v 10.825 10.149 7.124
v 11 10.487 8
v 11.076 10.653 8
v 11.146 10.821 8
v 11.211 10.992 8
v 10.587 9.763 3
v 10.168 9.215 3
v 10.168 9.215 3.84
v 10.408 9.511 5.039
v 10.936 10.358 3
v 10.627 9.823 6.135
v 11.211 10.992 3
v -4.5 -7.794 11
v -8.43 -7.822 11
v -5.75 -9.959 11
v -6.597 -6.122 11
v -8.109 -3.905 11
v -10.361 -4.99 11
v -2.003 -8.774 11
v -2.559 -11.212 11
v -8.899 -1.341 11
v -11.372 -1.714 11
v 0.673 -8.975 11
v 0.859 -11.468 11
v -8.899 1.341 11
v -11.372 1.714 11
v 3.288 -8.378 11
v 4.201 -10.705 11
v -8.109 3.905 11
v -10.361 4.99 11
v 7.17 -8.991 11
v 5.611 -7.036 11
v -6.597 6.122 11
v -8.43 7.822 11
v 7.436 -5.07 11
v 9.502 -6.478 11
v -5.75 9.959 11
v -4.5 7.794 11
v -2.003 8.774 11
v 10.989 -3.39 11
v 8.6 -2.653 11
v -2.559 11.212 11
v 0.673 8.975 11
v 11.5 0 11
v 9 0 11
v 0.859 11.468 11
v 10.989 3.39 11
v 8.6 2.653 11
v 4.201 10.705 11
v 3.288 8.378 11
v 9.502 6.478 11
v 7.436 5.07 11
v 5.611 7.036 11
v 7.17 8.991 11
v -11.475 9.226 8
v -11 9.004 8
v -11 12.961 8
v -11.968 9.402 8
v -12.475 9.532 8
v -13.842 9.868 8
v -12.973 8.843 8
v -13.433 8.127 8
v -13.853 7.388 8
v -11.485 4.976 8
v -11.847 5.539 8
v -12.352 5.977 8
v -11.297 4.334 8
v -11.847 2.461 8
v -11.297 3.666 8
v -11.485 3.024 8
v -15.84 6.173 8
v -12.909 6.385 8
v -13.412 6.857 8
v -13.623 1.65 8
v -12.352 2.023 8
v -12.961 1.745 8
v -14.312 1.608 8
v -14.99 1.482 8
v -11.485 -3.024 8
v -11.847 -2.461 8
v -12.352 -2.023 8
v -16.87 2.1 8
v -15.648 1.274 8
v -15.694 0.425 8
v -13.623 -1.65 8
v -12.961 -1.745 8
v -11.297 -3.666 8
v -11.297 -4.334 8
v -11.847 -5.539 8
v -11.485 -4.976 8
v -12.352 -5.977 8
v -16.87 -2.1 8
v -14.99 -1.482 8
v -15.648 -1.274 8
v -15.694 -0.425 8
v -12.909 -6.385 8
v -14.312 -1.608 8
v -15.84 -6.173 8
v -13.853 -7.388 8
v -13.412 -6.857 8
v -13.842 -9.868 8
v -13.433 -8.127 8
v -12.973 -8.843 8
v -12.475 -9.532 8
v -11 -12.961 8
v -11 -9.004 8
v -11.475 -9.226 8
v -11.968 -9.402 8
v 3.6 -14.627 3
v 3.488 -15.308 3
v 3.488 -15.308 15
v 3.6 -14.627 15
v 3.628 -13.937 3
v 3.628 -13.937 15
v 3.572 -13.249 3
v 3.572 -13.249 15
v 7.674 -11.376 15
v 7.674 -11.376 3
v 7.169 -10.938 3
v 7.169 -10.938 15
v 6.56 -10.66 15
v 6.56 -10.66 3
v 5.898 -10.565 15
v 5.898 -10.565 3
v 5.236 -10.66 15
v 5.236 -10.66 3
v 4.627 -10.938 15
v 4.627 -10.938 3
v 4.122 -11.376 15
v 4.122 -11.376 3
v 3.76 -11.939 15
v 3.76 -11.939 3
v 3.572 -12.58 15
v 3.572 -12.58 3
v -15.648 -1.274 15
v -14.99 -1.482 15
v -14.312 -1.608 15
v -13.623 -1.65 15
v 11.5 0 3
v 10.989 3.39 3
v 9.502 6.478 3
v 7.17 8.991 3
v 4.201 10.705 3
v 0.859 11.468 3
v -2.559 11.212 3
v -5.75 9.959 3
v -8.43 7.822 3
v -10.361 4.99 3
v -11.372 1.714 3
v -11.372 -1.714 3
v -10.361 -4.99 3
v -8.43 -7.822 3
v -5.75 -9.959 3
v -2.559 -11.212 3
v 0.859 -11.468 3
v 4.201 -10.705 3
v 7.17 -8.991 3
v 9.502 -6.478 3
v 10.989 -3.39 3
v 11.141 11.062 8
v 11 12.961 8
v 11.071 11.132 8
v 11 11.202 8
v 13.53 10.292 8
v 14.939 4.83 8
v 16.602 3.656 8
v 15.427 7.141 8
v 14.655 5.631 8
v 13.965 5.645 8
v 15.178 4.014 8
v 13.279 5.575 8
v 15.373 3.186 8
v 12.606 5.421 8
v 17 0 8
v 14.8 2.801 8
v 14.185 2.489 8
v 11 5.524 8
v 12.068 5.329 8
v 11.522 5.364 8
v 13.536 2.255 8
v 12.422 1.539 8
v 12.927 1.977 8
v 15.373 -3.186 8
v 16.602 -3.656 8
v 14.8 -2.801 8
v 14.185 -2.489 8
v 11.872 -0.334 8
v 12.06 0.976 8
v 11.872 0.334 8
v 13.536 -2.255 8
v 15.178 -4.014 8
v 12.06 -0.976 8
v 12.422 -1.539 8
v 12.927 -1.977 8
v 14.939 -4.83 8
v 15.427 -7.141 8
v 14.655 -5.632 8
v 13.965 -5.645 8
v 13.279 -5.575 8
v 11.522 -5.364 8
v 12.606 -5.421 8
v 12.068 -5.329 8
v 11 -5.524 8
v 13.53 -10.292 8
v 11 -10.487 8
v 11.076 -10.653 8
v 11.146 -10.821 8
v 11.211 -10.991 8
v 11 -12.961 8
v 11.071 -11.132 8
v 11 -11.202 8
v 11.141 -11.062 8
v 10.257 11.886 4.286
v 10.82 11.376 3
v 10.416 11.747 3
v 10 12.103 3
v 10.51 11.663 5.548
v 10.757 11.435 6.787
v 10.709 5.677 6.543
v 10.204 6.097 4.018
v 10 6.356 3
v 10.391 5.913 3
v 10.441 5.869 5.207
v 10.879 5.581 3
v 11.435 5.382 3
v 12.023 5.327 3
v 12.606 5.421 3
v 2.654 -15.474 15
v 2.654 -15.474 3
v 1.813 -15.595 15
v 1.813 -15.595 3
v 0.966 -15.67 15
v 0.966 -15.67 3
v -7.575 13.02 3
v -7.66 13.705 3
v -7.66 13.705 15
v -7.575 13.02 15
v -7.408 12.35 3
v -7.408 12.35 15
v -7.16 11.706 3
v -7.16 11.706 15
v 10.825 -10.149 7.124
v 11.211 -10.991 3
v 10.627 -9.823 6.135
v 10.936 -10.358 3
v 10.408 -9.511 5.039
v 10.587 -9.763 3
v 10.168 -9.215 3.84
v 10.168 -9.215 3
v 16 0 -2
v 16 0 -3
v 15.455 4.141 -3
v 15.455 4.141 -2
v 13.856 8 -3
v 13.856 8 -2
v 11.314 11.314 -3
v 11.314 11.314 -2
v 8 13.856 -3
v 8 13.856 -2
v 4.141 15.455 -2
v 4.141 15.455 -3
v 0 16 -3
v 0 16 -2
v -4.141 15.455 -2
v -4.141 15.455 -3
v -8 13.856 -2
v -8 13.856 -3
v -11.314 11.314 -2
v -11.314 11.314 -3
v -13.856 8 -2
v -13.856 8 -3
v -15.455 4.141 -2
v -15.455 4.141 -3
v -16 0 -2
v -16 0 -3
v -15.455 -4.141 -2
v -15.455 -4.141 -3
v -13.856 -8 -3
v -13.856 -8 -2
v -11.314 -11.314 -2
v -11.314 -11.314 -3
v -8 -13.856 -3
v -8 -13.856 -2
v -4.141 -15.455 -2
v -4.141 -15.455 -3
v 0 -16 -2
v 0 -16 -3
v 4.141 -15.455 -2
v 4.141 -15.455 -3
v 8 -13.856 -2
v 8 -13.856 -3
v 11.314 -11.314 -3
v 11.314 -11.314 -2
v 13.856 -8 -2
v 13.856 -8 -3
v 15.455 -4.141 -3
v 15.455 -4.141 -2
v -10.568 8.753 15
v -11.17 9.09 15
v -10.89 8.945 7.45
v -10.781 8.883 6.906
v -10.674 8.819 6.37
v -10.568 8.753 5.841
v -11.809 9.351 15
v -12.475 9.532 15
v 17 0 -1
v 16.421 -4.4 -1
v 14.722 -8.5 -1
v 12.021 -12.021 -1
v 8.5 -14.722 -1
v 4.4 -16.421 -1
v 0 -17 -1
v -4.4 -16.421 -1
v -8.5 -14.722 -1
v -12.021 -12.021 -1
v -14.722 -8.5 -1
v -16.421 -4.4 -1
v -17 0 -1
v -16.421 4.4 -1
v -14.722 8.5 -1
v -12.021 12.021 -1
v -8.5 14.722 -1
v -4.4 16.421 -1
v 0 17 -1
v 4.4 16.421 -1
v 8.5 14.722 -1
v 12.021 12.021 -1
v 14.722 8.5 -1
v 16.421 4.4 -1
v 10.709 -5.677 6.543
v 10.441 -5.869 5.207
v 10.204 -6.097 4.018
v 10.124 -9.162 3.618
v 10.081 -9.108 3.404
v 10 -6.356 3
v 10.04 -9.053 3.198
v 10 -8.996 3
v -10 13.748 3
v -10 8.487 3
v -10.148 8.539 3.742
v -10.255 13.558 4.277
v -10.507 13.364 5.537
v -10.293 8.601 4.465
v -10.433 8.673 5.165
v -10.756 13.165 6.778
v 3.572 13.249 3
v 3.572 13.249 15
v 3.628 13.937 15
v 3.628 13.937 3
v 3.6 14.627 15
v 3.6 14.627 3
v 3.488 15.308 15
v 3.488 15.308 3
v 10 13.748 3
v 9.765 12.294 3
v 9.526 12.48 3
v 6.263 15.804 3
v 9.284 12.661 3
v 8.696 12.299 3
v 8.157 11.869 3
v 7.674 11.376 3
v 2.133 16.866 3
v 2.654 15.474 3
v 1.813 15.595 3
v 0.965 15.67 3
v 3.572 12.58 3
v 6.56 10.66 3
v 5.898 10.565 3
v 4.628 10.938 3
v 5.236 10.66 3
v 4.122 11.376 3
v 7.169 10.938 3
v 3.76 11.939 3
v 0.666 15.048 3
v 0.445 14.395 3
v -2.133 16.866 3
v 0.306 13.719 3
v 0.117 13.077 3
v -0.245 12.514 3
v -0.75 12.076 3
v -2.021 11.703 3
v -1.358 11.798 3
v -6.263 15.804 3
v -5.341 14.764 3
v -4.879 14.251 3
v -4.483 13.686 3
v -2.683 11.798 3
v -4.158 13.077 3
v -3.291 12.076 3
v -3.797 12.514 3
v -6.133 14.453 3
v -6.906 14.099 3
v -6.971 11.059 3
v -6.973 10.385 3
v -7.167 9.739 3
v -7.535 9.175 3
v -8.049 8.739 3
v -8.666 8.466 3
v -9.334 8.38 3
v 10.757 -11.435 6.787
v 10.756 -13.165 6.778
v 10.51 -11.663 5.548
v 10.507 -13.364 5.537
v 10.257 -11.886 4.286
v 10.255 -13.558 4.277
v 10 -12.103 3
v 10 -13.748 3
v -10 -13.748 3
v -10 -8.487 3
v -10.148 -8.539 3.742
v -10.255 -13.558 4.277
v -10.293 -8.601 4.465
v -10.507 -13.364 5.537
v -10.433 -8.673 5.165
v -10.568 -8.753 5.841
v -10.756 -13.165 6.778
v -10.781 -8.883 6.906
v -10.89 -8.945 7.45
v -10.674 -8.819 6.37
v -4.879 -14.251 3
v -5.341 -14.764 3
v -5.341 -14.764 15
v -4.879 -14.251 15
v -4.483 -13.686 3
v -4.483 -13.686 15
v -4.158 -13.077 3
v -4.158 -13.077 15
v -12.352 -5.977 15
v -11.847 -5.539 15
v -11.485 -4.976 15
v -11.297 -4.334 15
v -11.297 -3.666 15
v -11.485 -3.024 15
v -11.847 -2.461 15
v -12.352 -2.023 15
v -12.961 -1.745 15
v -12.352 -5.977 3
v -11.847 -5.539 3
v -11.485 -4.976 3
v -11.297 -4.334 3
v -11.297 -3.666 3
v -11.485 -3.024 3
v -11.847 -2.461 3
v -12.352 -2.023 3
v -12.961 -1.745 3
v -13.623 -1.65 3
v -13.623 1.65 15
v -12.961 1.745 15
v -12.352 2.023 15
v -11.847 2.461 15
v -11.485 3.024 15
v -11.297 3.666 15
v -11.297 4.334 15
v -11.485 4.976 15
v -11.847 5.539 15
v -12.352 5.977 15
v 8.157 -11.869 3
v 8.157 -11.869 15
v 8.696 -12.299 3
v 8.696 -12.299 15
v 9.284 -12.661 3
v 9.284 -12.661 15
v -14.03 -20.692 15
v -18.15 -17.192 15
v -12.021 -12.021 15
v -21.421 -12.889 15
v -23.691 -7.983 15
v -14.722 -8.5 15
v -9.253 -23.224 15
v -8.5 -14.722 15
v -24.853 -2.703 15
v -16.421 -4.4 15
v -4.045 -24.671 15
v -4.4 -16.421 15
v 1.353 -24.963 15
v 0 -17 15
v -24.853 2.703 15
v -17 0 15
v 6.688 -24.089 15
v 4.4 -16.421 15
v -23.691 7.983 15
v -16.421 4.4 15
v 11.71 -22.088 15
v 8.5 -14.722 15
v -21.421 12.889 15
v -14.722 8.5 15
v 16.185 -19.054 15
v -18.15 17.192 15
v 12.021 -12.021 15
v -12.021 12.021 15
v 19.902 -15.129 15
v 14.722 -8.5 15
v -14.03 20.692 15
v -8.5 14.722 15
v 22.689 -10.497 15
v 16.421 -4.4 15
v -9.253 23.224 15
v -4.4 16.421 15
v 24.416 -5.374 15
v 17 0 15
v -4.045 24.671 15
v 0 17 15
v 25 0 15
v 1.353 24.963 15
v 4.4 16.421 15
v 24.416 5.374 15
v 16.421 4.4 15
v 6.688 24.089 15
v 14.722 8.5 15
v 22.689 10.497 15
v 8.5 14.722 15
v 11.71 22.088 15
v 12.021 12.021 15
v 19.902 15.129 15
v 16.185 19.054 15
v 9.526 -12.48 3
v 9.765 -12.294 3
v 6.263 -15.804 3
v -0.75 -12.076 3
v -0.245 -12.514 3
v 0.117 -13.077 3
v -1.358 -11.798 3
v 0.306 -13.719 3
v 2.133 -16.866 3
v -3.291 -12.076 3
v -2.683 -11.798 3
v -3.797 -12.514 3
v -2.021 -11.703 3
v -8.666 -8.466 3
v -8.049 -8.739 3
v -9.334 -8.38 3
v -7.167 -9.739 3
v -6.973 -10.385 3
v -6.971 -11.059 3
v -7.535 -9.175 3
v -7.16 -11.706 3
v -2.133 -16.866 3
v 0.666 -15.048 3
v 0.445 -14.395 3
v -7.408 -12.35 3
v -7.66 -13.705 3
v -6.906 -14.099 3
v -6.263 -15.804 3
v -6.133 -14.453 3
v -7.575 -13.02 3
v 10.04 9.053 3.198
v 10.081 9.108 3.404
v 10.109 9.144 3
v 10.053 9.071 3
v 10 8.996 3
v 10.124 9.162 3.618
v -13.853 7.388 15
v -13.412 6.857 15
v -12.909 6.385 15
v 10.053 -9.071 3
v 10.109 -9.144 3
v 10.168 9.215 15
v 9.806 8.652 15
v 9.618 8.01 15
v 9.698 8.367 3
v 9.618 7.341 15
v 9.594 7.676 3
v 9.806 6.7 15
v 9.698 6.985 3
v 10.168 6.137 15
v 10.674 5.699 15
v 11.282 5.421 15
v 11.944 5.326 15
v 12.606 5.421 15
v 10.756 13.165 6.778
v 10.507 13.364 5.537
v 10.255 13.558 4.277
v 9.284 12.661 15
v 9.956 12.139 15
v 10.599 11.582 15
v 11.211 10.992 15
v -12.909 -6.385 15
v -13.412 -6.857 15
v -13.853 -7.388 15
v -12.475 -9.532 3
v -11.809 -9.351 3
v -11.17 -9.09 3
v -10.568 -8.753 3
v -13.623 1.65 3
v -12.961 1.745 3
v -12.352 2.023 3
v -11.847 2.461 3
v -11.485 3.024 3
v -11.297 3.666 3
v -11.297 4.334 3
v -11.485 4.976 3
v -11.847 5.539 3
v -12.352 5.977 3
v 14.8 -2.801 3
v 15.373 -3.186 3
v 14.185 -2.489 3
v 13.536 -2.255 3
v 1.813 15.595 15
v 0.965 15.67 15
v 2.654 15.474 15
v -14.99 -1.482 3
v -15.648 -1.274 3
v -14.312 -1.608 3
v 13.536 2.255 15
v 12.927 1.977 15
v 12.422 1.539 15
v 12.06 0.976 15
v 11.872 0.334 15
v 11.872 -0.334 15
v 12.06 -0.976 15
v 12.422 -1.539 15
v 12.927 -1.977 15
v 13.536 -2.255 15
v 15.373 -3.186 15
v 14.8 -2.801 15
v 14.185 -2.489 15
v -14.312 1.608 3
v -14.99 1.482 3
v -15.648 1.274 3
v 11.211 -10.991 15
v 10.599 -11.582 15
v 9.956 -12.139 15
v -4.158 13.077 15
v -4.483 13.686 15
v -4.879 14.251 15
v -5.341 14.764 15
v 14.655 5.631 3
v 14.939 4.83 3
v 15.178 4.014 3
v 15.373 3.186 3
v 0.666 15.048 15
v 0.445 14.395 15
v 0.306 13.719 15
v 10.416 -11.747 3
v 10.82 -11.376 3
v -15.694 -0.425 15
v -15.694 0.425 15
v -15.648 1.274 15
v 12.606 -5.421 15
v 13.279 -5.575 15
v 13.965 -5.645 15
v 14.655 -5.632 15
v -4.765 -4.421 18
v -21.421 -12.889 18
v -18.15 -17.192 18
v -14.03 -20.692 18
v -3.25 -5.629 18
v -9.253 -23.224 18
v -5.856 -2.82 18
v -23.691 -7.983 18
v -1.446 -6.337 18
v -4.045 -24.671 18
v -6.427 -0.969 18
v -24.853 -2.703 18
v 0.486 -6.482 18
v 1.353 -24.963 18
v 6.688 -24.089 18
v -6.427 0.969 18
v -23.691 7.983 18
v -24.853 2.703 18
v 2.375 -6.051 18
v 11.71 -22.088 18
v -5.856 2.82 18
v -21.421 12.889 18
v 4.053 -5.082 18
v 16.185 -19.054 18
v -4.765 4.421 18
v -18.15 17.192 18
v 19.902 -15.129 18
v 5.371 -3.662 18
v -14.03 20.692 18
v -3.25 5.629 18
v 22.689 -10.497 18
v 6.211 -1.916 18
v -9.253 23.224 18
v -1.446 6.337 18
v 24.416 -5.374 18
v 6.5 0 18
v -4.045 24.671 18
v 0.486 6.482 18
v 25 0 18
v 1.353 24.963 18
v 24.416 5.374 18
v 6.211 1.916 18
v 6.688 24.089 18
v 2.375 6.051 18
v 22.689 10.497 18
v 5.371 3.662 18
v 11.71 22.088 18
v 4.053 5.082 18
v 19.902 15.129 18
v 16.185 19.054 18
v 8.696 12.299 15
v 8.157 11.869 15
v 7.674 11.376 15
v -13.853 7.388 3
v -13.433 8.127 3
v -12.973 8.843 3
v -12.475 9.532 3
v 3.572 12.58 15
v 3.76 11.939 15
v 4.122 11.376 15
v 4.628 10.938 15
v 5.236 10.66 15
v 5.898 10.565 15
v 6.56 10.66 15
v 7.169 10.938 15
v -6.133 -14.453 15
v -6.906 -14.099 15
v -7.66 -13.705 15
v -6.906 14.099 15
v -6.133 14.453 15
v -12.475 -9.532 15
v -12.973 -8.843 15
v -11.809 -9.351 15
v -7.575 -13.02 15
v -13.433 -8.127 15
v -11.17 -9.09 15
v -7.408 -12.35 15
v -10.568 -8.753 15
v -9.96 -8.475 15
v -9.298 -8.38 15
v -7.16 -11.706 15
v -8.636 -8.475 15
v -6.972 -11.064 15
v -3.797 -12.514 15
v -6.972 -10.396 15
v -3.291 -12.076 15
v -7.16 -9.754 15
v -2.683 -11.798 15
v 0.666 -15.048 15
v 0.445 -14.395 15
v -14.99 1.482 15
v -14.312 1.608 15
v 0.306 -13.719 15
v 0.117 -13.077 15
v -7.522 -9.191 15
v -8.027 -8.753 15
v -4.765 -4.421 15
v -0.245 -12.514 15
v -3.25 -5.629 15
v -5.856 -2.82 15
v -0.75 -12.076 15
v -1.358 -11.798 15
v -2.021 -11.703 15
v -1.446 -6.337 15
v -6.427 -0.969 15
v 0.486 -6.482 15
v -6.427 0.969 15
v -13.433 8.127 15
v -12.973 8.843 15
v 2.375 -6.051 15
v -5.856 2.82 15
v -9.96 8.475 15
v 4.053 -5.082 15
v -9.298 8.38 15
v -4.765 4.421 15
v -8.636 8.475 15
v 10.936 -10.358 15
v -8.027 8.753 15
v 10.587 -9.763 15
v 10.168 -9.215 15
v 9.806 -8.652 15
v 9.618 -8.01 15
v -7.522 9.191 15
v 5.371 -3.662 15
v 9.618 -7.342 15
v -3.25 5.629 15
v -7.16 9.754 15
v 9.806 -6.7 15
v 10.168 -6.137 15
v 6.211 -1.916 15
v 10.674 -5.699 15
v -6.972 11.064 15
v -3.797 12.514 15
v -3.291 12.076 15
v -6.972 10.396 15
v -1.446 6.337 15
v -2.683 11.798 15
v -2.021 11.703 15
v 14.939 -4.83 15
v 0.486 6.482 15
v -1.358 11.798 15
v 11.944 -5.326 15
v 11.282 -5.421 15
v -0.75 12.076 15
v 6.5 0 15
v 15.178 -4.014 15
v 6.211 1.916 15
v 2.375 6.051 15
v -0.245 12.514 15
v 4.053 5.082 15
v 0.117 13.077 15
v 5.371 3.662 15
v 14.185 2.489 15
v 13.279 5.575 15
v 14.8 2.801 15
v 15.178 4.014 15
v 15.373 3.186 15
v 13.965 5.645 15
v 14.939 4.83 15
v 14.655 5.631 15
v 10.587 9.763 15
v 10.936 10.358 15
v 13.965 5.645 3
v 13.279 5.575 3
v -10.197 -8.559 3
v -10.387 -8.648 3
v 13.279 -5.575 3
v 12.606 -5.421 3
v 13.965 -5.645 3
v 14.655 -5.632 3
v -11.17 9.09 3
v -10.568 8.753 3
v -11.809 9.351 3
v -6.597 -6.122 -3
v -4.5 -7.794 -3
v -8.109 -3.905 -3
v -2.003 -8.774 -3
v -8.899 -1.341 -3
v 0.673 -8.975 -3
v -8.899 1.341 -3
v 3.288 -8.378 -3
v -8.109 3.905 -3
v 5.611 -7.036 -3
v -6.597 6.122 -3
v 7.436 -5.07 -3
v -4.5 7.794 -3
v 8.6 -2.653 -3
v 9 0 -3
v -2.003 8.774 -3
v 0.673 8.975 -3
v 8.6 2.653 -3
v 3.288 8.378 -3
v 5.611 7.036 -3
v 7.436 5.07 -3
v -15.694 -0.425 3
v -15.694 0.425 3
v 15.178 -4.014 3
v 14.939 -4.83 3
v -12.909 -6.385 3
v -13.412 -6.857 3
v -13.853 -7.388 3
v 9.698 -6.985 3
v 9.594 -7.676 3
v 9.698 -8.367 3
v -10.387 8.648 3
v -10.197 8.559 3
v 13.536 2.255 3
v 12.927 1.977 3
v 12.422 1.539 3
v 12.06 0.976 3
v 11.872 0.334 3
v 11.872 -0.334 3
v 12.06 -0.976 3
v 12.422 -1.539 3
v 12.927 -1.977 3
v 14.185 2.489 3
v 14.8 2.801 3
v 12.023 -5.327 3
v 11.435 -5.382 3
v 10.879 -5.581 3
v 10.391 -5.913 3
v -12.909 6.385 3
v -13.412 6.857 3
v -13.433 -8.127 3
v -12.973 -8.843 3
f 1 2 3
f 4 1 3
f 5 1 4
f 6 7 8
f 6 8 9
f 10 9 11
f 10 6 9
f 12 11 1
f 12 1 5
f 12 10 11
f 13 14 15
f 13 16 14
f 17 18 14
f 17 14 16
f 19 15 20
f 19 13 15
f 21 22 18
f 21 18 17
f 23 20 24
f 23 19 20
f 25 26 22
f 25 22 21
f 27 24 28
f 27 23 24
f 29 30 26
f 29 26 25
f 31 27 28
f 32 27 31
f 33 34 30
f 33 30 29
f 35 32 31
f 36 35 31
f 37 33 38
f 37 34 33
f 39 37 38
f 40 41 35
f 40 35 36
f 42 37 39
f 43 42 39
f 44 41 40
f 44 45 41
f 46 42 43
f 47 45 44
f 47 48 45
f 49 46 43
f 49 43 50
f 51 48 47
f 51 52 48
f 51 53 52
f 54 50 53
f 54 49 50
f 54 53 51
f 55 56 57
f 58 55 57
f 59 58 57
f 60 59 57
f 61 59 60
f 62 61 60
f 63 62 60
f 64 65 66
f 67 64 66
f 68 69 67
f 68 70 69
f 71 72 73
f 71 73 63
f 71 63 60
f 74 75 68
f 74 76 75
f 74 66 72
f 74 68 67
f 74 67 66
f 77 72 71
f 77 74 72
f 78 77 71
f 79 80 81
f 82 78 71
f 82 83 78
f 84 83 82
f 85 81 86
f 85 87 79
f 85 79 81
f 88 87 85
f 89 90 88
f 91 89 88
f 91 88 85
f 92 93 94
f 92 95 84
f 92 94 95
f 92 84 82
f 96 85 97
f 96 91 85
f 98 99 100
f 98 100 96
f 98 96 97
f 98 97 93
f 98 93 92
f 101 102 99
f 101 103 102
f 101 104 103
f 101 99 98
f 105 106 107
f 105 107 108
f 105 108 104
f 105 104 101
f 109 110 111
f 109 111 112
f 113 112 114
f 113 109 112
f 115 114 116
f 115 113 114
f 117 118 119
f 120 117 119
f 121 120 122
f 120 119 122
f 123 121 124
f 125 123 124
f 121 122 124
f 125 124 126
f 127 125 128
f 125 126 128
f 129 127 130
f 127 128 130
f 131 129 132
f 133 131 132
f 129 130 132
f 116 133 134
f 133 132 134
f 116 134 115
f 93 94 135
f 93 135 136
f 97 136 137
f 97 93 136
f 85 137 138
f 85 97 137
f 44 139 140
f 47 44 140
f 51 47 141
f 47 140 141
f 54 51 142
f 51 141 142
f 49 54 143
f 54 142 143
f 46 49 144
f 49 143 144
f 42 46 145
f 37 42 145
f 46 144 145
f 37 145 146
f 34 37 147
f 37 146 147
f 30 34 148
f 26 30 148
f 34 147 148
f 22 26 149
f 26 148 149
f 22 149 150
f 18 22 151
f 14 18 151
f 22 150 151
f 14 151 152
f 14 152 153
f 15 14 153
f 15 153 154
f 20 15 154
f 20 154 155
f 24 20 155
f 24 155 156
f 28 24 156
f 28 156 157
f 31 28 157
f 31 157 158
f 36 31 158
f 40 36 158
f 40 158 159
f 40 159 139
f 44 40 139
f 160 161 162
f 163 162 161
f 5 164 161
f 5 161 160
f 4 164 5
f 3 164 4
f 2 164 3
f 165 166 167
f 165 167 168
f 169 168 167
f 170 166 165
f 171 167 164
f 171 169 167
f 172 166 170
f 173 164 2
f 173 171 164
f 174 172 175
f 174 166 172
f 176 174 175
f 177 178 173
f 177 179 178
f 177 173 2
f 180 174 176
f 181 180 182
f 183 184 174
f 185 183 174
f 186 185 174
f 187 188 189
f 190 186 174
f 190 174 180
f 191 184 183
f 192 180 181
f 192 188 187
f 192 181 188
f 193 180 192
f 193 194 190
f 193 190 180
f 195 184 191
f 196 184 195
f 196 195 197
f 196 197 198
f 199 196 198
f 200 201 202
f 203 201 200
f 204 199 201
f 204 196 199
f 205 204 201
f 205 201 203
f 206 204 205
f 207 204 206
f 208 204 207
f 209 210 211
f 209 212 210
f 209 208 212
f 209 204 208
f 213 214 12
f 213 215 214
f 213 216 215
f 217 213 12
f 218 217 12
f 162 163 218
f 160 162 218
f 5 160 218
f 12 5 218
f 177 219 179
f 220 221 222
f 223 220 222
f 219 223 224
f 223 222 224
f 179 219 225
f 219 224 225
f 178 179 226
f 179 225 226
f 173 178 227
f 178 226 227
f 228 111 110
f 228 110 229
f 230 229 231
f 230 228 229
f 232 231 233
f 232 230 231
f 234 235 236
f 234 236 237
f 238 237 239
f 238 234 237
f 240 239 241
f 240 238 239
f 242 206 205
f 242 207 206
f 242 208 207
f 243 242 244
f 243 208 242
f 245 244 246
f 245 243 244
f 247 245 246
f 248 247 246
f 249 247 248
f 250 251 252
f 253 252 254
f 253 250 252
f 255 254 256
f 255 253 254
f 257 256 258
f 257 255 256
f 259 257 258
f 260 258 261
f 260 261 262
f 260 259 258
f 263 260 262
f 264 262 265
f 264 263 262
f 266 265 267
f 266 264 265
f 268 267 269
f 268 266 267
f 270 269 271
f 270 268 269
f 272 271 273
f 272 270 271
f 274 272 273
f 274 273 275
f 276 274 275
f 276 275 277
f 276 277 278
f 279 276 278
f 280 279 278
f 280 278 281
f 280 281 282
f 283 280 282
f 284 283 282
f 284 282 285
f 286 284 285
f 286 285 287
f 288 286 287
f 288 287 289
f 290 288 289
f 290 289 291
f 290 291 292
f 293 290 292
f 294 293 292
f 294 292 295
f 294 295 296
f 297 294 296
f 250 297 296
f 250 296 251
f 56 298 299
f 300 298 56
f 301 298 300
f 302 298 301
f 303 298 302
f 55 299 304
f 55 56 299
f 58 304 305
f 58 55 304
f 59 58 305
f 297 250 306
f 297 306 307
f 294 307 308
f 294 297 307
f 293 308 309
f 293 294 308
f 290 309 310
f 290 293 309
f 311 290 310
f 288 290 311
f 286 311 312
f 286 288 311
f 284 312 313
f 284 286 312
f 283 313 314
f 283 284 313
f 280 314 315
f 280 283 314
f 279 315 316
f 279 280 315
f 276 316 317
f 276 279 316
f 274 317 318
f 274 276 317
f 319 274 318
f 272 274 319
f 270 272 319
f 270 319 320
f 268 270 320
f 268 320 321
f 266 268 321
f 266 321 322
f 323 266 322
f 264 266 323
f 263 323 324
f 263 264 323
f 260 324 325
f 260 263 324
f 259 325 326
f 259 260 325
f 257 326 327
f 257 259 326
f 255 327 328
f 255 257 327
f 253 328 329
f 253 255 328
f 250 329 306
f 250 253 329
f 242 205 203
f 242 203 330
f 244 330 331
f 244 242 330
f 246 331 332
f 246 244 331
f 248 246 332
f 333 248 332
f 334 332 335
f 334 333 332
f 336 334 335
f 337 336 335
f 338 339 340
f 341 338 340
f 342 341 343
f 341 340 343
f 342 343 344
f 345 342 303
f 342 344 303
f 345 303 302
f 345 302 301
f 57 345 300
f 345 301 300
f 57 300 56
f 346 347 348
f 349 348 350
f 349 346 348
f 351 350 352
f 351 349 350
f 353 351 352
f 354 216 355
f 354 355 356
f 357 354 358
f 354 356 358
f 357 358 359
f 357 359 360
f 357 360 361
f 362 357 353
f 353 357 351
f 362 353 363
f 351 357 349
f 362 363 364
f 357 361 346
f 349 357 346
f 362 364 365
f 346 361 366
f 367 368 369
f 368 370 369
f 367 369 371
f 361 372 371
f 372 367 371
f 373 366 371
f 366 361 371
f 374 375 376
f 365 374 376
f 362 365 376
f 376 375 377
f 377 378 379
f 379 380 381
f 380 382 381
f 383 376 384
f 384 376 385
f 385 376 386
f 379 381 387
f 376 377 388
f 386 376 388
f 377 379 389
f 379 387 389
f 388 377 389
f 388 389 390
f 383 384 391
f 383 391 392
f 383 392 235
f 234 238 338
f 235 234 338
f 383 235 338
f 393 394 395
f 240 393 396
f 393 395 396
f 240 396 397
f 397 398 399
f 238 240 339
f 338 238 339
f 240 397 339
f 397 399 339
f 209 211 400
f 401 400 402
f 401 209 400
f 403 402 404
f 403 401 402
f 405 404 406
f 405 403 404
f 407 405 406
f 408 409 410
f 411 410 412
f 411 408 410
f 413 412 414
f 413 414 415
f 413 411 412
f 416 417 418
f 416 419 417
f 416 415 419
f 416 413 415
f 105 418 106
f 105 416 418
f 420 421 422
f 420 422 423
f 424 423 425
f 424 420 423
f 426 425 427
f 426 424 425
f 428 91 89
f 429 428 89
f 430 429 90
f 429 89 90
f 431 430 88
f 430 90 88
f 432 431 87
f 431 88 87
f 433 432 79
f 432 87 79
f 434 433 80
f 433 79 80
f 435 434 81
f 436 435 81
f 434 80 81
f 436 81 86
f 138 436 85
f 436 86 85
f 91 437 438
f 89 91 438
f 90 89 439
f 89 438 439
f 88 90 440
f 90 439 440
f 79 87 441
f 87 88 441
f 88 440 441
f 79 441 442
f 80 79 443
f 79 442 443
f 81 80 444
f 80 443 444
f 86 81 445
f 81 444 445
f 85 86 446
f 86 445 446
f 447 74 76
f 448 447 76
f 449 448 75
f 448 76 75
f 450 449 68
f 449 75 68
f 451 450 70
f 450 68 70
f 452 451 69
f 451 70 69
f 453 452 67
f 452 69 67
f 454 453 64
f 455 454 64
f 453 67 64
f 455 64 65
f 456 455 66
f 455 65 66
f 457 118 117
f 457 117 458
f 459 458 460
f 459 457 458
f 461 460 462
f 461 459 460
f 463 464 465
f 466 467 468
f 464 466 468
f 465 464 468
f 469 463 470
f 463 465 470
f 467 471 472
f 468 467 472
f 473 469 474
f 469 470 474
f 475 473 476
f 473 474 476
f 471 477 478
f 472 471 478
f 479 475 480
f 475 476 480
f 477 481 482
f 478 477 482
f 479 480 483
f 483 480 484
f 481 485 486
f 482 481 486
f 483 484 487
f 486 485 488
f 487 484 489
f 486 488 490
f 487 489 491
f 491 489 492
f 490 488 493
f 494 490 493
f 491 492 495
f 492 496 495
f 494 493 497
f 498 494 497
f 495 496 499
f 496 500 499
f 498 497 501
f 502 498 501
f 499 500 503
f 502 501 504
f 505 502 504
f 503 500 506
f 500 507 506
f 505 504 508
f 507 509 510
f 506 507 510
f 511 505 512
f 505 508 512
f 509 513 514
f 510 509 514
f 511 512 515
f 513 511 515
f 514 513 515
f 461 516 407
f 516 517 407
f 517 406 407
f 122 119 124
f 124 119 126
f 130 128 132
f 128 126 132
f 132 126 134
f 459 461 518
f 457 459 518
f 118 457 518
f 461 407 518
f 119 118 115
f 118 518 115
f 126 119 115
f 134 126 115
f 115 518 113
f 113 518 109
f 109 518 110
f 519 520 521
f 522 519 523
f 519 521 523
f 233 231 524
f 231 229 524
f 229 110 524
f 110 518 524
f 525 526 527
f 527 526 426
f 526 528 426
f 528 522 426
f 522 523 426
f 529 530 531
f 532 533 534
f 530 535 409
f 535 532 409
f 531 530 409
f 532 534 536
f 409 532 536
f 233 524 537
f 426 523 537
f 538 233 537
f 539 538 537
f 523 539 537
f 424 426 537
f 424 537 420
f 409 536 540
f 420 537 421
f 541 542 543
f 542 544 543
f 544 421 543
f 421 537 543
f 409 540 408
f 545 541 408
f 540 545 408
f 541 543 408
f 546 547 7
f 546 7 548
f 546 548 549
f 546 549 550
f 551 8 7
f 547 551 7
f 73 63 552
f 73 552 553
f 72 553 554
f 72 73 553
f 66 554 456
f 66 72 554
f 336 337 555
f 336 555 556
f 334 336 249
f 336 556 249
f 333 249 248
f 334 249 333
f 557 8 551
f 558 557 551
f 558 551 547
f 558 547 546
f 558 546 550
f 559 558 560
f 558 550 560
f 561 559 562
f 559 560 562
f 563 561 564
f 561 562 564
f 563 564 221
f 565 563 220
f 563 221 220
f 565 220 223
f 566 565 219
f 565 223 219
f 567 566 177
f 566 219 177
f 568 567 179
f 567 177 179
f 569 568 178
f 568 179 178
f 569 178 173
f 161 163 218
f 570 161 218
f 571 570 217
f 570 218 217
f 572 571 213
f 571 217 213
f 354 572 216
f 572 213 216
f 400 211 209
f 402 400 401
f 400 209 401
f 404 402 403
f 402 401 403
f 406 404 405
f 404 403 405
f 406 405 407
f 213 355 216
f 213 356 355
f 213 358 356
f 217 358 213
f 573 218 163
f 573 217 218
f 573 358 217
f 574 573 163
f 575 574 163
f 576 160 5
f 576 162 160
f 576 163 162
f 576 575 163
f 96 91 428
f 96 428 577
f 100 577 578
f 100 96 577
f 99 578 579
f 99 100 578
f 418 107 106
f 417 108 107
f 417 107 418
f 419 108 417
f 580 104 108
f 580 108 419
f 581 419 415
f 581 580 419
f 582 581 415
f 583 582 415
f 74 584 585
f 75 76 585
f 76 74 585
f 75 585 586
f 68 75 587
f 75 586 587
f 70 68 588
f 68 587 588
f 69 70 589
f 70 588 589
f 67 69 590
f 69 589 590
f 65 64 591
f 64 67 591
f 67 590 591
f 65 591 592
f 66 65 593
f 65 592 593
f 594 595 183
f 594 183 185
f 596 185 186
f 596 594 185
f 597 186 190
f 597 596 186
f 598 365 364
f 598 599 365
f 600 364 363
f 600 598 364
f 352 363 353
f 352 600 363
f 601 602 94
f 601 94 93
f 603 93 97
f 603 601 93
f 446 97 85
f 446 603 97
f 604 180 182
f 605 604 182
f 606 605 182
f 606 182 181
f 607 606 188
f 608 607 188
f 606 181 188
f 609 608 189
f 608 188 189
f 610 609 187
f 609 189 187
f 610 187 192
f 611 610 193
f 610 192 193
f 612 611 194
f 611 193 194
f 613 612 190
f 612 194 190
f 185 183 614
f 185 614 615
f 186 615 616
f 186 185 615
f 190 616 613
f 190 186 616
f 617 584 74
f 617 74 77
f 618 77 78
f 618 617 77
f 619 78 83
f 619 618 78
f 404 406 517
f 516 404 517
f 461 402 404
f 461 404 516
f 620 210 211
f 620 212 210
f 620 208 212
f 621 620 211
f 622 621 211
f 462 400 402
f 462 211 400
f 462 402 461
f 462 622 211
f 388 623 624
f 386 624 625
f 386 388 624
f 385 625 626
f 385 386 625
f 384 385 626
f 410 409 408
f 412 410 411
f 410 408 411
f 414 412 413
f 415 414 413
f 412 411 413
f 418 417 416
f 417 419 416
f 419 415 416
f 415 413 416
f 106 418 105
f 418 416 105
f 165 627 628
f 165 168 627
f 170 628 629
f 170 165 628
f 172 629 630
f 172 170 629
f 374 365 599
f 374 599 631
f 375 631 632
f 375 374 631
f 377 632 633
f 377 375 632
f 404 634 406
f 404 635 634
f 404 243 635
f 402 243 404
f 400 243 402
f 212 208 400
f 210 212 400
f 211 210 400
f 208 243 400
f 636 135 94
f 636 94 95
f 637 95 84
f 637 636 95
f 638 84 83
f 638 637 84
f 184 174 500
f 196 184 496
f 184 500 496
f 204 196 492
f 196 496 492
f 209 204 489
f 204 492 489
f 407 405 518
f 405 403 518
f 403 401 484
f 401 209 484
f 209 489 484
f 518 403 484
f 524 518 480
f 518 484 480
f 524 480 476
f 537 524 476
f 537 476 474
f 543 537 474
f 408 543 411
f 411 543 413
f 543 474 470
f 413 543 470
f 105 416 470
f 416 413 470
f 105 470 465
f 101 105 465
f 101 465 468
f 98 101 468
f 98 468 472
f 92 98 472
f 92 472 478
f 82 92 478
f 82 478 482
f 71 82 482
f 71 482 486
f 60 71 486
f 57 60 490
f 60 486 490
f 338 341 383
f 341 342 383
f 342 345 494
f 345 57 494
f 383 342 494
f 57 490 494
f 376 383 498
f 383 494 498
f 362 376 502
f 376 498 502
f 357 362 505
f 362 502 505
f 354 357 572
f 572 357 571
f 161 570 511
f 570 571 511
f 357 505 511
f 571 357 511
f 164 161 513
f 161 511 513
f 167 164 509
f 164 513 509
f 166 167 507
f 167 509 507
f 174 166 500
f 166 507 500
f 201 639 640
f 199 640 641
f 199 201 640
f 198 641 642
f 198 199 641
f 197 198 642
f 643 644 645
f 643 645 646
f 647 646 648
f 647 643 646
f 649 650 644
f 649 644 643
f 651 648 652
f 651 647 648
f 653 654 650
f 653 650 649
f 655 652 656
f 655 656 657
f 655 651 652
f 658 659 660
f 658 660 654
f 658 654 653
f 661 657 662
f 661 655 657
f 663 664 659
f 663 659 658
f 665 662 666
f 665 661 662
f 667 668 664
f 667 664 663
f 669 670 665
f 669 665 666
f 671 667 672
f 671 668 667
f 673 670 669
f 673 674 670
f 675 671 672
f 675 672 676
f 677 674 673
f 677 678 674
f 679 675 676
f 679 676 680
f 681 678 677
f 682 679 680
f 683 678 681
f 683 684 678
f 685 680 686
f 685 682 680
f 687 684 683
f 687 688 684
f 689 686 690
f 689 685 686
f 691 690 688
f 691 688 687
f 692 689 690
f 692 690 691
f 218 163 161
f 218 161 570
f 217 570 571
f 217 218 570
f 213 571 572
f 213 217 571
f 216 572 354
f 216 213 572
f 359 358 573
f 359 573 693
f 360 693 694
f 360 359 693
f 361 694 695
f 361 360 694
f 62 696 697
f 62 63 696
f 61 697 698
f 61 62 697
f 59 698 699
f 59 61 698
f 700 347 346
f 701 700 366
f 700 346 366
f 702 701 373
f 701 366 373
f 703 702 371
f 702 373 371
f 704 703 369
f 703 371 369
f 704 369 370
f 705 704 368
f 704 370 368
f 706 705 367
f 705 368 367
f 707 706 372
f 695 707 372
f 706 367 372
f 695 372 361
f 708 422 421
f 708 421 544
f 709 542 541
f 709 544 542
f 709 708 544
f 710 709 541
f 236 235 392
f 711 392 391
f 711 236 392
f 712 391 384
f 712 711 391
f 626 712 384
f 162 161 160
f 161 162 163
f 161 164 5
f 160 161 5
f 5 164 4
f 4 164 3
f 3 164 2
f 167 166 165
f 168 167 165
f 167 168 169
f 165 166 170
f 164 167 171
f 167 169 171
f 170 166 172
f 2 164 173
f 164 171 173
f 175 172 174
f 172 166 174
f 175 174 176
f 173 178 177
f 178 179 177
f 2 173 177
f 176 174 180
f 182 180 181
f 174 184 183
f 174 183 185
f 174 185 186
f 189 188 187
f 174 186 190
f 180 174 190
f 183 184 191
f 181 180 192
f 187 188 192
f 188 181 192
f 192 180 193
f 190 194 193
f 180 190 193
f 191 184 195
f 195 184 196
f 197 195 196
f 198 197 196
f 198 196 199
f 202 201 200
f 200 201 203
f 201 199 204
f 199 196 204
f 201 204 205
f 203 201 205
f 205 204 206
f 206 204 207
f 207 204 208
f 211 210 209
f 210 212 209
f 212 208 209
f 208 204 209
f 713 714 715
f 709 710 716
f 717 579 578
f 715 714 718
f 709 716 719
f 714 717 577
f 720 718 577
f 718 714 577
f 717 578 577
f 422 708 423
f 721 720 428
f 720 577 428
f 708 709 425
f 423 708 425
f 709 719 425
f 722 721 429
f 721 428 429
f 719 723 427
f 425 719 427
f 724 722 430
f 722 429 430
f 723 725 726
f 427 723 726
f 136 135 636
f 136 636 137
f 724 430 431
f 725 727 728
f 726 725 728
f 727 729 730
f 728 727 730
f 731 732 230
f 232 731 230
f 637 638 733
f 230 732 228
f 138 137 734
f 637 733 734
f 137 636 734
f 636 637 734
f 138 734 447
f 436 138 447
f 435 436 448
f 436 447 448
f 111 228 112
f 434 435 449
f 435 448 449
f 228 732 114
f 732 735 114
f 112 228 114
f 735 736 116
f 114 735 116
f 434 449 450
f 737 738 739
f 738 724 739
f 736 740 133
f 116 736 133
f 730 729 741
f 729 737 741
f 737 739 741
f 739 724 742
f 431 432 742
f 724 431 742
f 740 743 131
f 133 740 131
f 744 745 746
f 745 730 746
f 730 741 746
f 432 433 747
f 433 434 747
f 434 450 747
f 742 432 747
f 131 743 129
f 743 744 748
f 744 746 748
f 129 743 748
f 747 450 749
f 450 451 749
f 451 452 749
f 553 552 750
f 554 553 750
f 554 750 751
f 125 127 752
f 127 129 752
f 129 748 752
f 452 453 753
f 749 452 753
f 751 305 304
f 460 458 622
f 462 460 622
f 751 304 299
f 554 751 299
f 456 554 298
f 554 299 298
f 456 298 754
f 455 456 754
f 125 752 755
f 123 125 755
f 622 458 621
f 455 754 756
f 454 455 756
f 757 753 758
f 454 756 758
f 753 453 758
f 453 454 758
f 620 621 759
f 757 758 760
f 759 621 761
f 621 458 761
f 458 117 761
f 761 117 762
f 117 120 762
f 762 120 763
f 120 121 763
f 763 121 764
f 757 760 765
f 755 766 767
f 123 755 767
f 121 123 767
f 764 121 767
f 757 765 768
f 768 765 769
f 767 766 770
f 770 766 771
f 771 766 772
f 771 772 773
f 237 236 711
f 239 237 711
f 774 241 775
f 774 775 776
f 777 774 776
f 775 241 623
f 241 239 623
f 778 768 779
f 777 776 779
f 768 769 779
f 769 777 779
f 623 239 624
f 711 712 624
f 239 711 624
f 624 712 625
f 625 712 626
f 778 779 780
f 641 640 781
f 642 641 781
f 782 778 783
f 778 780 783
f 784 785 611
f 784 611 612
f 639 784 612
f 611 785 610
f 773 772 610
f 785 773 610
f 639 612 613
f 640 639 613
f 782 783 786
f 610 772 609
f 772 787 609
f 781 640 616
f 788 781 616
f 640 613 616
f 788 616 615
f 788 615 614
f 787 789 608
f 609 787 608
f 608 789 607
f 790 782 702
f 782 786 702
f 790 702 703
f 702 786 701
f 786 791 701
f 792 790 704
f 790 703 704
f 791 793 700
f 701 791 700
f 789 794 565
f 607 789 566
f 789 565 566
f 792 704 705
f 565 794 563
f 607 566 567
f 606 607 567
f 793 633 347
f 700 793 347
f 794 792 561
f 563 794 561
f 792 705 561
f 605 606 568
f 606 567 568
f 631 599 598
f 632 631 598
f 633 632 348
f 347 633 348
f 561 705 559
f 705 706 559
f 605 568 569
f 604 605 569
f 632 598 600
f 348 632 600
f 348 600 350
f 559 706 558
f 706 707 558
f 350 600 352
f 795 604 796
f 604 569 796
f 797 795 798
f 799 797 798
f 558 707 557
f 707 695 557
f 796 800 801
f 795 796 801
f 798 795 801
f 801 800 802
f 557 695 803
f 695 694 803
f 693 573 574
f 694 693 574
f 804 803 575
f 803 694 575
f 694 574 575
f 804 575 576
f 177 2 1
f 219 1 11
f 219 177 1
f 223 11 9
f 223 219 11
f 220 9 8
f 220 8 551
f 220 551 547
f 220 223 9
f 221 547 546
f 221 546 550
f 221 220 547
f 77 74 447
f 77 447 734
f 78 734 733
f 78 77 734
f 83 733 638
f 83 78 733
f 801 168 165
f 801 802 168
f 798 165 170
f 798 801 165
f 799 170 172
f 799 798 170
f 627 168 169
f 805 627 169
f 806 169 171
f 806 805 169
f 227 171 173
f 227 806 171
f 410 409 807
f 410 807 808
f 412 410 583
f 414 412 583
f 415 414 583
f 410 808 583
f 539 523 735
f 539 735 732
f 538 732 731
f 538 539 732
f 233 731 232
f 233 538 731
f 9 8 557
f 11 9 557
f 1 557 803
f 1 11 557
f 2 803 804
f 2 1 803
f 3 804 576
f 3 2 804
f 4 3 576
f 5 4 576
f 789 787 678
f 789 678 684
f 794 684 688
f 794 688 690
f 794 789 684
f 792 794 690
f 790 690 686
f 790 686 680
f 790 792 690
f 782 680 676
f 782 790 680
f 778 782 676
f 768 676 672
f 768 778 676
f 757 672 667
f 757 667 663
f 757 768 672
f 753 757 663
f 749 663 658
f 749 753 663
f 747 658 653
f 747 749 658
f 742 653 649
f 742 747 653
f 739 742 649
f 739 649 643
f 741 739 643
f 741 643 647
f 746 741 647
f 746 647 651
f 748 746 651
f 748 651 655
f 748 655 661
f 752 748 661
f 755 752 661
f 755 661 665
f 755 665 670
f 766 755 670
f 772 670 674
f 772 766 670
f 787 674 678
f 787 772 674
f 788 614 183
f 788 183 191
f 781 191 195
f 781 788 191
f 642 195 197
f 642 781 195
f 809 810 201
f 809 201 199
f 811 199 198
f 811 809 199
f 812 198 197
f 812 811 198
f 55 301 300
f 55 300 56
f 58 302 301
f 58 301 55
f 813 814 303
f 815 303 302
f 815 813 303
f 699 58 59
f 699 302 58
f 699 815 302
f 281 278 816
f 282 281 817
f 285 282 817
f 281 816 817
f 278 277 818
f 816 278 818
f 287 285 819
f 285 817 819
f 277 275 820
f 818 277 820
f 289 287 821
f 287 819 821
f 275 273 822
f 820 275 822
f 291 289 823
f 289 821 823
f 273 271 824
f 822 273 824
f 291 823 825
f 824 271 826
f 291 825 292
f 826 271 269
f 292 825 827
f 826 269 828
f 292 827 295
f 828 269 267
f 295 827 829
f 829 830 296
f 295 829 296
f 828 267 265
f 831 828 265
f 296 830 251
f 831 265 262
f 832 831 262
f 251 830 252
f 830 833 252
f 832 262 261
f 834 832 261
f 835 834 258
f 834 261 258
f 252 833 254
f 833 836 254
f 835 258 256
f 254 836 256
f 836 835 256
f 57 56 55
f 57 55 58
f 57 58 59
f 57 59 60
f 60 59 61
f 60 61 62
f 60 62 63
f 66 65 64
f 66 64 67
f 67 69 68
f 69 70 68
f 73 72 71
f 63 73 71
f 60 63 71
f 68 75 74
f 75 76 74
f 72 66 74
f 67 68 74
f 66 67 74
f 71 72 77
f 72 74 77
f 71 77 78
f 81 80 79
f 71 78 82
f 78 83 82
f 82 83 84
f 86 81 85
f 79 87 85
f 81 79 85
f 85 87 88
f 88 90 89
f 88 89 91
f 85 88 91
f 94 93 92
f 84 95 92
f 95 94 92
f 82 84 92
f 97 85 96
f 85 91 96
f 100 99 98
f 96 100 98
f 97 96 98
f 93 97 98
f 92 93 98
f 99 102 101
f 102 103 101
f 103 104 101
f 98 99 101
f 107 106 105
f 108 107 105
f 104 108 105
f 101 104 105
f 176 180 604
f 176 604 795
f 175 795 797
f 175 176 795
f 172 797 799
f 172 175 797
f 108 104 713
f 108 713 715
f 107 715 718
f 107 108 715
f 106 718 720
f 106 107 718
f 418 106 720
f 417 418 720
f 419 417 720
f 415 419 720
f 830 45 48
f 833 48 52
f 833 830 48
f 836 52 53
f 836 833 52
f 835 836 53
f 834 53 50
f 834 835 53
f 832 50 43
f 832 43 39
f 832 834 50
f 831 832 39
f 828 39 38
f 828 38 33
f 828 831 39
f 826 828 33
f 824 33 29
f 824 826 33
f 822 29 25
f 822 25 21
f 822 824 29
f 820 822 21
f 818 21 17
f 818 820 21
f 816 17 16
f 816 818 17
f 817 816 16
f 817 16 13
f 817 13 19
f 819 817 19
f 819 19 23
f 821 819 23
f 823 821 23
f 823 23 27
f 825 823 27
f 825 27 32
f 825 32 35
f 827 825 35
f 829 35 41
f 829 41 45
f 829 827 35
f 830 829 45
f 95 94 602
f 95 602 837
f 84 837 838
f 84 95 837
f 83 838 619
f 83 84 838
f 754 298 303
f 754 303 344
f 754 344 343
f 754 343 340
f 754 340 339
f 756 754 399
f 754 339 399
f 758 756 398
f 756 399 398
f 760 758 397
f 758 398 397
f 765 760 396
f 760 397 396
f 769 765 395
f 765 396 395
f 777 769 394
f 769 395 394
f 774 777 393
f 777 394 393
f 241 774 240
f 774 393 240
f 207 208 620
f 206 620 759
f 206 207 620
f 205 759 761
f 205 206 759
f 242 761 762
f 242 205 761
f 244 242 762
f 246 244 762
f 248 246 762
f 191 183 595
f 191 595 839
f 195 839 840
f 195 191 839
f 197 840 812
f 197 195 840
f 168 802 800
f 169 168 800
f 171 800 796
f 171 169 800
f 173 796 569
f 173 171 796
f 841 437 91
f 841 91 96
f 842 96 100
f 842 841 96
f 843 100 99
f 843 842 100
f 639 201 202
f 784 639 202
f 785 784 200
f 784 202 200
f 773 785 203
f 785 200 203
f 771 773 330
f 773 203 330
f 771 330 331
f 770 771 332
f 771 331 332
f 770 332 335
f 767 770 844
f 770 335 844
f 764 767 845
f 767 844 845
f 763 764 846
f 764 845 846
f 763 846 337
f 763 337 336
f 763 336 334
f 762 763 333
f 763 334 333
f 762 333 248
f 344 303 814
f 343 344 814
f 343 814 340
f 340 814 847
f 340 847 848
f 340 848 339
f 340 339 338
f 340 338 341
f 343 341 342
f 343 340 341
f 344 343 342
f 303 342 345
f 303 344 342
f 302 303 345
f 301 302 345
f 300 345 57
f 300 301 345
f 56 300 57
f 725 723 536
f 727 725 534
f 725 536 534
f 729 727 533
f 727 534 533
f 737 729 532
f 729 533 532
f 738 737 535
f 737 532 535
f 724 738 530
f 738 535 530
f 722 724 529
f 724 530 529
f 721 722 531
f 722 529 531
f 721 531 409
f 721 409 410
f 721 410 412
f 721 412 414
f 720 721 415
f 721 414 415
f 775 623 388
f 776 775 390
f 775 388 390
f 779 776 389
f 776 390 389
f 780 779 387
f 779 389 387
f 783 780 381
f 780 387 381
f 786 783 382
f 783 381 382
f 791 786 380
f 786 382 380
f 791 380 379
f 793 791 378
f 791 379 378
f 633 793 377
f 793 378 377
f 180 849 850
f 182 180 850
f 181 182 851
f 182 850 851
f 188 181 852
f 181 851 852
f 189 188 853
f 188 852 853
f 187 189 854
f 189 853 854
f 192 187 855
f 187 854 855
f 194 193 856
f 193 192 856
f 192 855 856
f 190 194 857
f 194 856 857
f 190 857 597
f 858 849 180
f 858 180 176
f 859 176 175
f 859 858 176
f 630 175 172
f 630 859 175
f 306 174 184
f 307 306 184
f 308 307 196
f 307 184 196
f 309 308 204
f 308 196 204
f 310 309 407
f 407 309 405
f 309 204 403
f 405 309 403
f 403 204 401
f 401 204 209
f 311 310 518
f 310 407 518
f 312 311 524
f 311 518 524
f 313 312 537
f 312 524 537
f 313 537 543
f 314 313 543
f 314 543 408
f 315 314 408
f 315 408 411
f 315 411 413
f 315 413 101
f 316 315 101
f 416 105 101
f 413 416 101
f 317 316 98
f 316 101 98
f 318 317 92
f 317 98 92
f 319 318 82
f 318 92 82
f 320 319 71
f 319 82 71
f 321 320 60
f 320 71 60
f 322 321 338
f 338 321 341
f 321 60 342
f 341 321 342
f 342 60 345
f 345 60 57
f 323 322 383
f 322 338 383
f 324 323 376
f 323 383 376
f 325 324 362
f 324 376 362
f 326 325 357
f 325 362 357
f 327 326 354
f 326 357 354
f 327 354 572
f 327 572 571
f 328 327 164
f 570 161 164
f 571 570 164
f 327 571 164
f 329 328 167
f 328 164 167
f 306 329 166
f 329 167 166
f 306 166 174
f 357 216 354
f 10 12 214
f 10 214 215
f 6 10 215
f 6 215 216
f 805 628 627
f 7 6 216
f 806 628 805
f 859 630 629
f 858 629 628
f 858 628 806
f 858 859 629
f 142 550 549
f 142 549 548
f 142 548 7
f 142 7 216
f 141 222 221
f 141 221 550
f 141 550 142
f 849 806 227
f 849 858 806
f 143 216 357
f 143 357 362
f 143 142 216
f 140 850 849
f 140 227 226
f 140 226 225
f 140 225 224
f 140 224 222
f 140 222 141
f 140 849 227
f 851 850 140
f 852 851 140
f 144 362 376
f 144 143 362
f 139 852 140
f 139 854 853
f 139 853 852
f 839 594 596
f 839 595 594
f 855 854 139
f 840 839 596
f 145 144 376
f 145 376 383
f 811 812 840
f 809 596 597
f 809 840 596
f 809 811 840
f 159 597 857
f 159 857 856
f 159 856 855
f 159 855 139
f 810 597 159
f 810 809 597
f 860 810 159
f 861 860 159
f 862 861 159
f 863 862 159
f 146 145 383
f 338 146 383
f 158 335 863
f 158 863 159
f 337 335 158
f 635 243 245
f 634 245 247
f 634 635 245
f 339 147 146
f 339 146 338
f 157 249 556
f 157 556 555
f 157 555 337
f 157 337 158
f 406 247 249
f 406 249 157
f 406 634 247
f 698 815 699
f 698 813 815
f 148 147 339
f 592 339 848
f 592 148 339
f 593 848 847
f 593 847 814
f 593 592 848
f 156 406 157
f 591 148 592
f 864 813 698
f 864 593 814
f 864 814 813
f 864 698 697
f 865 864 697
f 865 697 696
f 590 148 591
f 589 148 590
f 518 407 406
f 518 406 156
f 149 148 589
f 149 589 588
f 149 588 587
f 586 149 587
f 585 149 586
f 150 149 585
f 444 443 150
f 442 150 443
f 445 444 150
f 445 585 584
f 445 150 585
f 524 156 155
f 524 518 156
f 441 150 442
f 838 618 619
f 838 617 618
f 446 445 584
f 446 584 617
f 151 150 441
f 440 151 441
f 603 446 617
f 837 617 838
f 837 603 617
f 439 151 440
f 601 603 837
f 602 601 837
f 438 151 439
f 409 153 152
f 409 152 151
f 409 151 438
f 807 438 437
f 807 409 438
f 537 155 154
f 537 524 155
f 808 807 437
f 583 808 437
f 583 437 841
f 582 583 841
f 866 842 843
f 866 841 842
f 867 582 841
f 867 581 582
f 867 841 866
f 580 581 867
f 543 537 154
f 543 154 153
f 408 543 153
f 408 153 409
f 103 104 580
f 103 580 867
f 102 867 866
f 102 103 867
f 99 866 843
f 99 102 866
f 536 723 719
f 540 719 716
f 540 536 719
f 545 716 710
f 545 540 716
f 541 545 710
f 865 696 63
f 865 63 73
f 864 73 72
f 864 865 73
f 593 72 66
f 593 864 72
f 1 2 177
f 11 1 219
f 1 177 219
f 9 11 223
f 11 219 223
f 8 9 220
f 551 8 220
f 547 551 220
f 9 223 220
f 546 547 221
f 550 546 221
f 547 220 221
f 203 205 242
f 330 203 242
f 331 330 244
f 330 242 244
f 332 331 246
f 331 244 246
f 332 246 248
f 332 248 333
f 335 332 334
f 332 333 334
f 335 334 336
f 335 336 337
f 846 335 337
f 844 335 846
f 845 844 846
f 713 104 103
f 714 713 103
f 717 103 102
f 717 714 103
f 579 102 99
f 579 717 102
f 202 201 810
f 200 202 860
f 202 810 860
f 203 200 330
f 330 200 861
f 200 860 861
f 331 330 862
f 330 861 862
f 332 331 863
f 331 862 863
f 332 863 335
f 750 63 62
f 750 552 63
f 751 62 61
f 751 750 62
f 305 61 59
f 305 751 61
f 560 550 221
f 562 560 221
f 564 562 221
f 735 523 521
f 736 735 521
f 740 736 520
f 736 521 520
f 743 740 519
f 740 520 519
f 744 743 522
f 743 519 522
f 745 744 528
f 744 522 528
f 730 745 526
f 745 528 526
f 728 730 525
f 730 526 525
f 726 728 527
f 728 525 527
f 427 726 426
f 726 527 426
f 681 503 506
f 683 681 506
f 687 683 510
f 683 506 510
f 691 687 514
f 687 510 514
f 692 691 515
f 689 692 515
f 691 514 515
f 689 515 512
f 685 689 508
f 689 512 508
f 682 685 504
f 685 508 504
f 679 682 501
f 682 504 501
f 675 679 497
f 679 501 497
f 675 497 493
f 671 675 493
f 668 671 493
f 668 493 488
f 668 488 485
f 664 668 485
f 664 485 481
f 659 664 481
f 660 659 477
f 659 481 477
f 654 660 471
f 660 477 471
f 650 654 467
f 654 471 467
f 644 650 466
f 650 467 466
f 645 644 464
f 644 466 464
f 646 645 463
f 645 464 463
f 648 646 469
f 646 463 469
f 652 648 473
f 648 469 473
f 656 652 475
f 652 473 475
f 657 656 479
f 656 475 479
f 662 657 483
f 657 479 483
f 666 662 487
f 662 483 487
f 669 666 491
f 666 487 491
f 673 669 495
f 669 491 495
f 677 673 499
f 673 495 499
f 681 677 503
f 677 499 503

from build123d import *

# Parameters (mm, degrees)
PAD004_DEPTH      = 20
PAD004_DEPTH_BACK = 20
SKETCH_R          = 20
PAD_DEPTH         = 15
SKETCH001_R       = 20
SKETCH001_R_2     = 15.7
PAD001_DEPTH      = 15
SKETCH002_R       = 20
SKETCH002_R_2     = 17
POCKET_DEPTH      = 15
SKETCH003_R       = 25
SKETCH003_R_2     = 6.5
PAD002_DEPTH      = 3
SKETCH004_R       = 17
SKETCH004_R_2     = 15.7
PAD003_DEPTH      = 2
CHAMFER_SIZE      = 1
SKETCH006_R       = 16
SKETCH006_R_2     = 9
PAD005_DEPTH      = 3
SKETCH007_R       = 11.5
SKETCH007_R_2     = 9
PAD006_DEPTH      = 11
SKETCH008_R       = 16
SKETCH008_R_2     = 9
PAD007_DEPTH      = 3


with BuildPart() as body001:
    # Sketch005 → Pad004 (new body, two sides)
    with BuildSketch(Plane.XZ) as pad004_sk:
        Polygon((-25, 8), (-25, -3), (25, -3), (25, 8), (11, 8), (10, 3), (-10, 3), (-11, 8), align=None)
    extrude(amount=PAD004_DEPTH)
    extrude(pad004_sk.sketch, amount=-PAD004_DEPTH_BACK)


with BuildPart() as body:
    # Sketch → Pad (new body)
    with BuildSketch(Plane.XY):
        Circle(SKETCH_R)
        with BuildLine():
            ThreePointArc((10.167973, 9.214823), (11.257777, 11.127264), (11.534091, 13.311011))
            ThreePointArc((11.534091, 13.311011), (9.411904, 12.72674), (7.674027, 11.375877))
            ThreePointArc((3.571901, 13.249202), (4.921792, 10.777143), (7.674027, 11.375877))
            ThreePointArc((3.571901, 13.249202), (3.454758, 15.447252), (2.506576, 17.433732))
            ThreePointArc((2.506576, 17.433732), (1.03717, 15.794875), (0.305512, 13.718898))
            ThreePointArc((-4.158239, 13.077082), (-1.686132, 11.727209), (0.305512, 13.718898))
            ThreePointArc((-4.158239, 13.077082), (-5.44512, 14.862823), (-7.316711, 16.021305))
            ThreePointArc((-7.316711, 16.021305), (-7.666817, 13.848196), (-7.159961, 11.706218))
            ThreePointArc((-10.568123, 8.753065), (-7.758688, 8.953979), (-7.159961, 11.706218))
            ThreePointArc((-10.568123, 8.753065), (-12.616172, 9.559584), (-14.816988, 9.522295))
            ThreePointArc((-14.816988, 9.522295), (-13.936641, 7.504866), (-12.352198, 5.976935))
            ThreePointArc((-13.6227, 1.649999), (-11.367897, 3.337924), (-12.352198, 5.976935))
            ThreePointArc((-13.6227, 1.649999), (-15.781693, 1.22123), (-17.613, 0))
            ThreePointArc((-17.613, 0), (-15.781693, -1.221231), (-13.6227, -1.65))
            ThreePointArc((-12.352198, -5.976935), (-11.367897, -3.337925), (-13.6227, -1.65))
            ThreePointArc((-12.352198, -5.976935), (-13.936641, -7.504866), (-14.816988, -9.522295))
            ThreePointArc((-14.816988, -9.522295), (-12.616172, -9.559584), (-10.568123, -8.753065))
            ThreePointArc((-7.159961, -11.706193), (-7.758705, -8.953976), (-10.568123, -8.753065))
            ThreePointArc((-7.159961, -11.706193), (-7.666827, -13.848185), (-7.31672, -16.021308))
            ThreePointArc((-7.31672, -16.021308), (-5.445123, -14.862826), (-4.158239, -13.077082))
            ThreePointArc((0.305552, -13.718898), (-1.686111, -11.72719), (-4.158239, -13.077082))
            ThreePointArc((0.305552, -13.718898), (1.037203, -15.794852), (2.50659, -17.433692))
            ThreePointArc((2.50659, -17.433692), (3.454749, -15.447236), (3.57189, -13.249216))
            ThreePointArc((7.674027, -11.375877), (4.921778, -10.77714), (3.57189, -13.249216))
            ThreePointArc((7.674027, -11.375877), (9.411909, -12.726743), (11.534102, -13.311012))
            ThreePointArc((11.534102, -13.311012), (11.257789, -11.12726), (10.167982, -9.214815))
            ThreePointArc((12.606008, -5.421194), (9.967097, -6.405487), (10.167982, -9.214815))
            ThreePointArc((12.606008, -5.421194), (14.798398, -5.618045), (16.899628, -4.962185))
            ThreePointArc((16.899628, -4.962185), (15.486563, -3.274452), (13.535809, -2.25477))
            ThreePointArc((13.535809, 2.254753), (11.847868, -9e-06), (13.535809, -2.25477))
            ThreePointArc((13.535809, 2.254753), (15.48656, 3.274427), (16.899628, 4.962149))
            ThreePointArc((16.899628, 4.962149), (14.798412, 5.618013), (12.606035, 5.42117))
            ThreePointArc((10.167973, 9.214823), (9.967084, 6.405459), (12.606035, 5.42117))
        make_face(mode=Mode.SUBTRACT)
    extrude(amount=PAD_DEPTH)

    # Sketch001 (on Face36 of Pad) → Pad001 (join)
    with BuildSketch(Plane.XY.offset(15)):
        Circle(SKETCH001_R)
        Circle(SKETCH001_R_2, mode=Mode.SUBTRACT)
    extrude(amount=-PAD001_DEPTH)

    # Sketch002 (on Face3 of Pad001) → Pocket (cut)
    with BuildSketch(Plane.XY.offset(15)):
        Circle(SKETCH002_R)
        Circle(SKETCH002_R_2, mode=Mode.SUBTRACT)
    extrude(amount=-POCKET_DEPTH, mode=Mode.SUBTRACT)

    # Sketch003 (on Face60 of Pocket) → Pad002 (join)
    with BuildSketch(Plane.XY.offset(15)):
        Circle(SKETCH003_R)
        Circle(SKETCH003_R_2, mode=Mode.SUBTRACT)
    extrude(amount=PAD002_DEPTH)

    # Sketch004 (on Face49 of Pad002) → Pad003 (join)
    with BuildSketch(Plane(origin=(0, 0, 0), x_dir=(1, 0, 0), z_dir=(0, 0, -1))):
        Circle(SKETCH004_R)
        Circle(SKETCH004_R_2, mode=Mode.SUBTRACT)
    extrude(amount=PAD003_DEPTH)

    # Chamfer
    chamfer_edges = [body.edges().sort_by_distance(p)[0] for p in [
        (-17, 0, -2),
    ]]
    chamfer(chamfer_edges, length=CHAMFER_SIZE)


with BuildPart() as cut:
    # Cut base: copy of Body
    add(body.part)

    # Cut: cut Body001
    add(body001.part, mode=Mode.SUBTRACT)


with BuildPart() as body002:
    # Sketch006 → Pad005 (new body)
    with BuildSketch(Plane.XY):
        Circle(SKETCH006_R)
        Circle(SKETCH006_R_2, mode=Mode.SUBTRACT)
    extrude(amount=-PAD005_DEPTH)

    # Sketch007 (on Face3 of Pad005) → Pad006 (join)
    with BuildSketch(Plane.XY):
        Circle(SKETCH007_R)
        Circle(SKETCH007_R_2, mode=Mode.SUBTRACT)
    extrude(amount=PAD006_DEPTH)

    # Sketch008 (on Face2 of Pad006) → Pad007 (join)
    with BuildSketch(Plane.XY):
        Circle(SKETCH008_R)
        Circle(SKETCH008_R_2, mode=Mode.SUBTRACT)
    extrude(amount=PAD007_DEPTH)


with BuildPart() as fusion:
    # Common base: copy of Body
    add(body.part)

    # Common: intersect Body001
    add(body001.part, mode=Mode.INTERSECT)

    # Fusion: union Body002
    add(body002.part)


solid = Compound([cut.part, fusion.part])
